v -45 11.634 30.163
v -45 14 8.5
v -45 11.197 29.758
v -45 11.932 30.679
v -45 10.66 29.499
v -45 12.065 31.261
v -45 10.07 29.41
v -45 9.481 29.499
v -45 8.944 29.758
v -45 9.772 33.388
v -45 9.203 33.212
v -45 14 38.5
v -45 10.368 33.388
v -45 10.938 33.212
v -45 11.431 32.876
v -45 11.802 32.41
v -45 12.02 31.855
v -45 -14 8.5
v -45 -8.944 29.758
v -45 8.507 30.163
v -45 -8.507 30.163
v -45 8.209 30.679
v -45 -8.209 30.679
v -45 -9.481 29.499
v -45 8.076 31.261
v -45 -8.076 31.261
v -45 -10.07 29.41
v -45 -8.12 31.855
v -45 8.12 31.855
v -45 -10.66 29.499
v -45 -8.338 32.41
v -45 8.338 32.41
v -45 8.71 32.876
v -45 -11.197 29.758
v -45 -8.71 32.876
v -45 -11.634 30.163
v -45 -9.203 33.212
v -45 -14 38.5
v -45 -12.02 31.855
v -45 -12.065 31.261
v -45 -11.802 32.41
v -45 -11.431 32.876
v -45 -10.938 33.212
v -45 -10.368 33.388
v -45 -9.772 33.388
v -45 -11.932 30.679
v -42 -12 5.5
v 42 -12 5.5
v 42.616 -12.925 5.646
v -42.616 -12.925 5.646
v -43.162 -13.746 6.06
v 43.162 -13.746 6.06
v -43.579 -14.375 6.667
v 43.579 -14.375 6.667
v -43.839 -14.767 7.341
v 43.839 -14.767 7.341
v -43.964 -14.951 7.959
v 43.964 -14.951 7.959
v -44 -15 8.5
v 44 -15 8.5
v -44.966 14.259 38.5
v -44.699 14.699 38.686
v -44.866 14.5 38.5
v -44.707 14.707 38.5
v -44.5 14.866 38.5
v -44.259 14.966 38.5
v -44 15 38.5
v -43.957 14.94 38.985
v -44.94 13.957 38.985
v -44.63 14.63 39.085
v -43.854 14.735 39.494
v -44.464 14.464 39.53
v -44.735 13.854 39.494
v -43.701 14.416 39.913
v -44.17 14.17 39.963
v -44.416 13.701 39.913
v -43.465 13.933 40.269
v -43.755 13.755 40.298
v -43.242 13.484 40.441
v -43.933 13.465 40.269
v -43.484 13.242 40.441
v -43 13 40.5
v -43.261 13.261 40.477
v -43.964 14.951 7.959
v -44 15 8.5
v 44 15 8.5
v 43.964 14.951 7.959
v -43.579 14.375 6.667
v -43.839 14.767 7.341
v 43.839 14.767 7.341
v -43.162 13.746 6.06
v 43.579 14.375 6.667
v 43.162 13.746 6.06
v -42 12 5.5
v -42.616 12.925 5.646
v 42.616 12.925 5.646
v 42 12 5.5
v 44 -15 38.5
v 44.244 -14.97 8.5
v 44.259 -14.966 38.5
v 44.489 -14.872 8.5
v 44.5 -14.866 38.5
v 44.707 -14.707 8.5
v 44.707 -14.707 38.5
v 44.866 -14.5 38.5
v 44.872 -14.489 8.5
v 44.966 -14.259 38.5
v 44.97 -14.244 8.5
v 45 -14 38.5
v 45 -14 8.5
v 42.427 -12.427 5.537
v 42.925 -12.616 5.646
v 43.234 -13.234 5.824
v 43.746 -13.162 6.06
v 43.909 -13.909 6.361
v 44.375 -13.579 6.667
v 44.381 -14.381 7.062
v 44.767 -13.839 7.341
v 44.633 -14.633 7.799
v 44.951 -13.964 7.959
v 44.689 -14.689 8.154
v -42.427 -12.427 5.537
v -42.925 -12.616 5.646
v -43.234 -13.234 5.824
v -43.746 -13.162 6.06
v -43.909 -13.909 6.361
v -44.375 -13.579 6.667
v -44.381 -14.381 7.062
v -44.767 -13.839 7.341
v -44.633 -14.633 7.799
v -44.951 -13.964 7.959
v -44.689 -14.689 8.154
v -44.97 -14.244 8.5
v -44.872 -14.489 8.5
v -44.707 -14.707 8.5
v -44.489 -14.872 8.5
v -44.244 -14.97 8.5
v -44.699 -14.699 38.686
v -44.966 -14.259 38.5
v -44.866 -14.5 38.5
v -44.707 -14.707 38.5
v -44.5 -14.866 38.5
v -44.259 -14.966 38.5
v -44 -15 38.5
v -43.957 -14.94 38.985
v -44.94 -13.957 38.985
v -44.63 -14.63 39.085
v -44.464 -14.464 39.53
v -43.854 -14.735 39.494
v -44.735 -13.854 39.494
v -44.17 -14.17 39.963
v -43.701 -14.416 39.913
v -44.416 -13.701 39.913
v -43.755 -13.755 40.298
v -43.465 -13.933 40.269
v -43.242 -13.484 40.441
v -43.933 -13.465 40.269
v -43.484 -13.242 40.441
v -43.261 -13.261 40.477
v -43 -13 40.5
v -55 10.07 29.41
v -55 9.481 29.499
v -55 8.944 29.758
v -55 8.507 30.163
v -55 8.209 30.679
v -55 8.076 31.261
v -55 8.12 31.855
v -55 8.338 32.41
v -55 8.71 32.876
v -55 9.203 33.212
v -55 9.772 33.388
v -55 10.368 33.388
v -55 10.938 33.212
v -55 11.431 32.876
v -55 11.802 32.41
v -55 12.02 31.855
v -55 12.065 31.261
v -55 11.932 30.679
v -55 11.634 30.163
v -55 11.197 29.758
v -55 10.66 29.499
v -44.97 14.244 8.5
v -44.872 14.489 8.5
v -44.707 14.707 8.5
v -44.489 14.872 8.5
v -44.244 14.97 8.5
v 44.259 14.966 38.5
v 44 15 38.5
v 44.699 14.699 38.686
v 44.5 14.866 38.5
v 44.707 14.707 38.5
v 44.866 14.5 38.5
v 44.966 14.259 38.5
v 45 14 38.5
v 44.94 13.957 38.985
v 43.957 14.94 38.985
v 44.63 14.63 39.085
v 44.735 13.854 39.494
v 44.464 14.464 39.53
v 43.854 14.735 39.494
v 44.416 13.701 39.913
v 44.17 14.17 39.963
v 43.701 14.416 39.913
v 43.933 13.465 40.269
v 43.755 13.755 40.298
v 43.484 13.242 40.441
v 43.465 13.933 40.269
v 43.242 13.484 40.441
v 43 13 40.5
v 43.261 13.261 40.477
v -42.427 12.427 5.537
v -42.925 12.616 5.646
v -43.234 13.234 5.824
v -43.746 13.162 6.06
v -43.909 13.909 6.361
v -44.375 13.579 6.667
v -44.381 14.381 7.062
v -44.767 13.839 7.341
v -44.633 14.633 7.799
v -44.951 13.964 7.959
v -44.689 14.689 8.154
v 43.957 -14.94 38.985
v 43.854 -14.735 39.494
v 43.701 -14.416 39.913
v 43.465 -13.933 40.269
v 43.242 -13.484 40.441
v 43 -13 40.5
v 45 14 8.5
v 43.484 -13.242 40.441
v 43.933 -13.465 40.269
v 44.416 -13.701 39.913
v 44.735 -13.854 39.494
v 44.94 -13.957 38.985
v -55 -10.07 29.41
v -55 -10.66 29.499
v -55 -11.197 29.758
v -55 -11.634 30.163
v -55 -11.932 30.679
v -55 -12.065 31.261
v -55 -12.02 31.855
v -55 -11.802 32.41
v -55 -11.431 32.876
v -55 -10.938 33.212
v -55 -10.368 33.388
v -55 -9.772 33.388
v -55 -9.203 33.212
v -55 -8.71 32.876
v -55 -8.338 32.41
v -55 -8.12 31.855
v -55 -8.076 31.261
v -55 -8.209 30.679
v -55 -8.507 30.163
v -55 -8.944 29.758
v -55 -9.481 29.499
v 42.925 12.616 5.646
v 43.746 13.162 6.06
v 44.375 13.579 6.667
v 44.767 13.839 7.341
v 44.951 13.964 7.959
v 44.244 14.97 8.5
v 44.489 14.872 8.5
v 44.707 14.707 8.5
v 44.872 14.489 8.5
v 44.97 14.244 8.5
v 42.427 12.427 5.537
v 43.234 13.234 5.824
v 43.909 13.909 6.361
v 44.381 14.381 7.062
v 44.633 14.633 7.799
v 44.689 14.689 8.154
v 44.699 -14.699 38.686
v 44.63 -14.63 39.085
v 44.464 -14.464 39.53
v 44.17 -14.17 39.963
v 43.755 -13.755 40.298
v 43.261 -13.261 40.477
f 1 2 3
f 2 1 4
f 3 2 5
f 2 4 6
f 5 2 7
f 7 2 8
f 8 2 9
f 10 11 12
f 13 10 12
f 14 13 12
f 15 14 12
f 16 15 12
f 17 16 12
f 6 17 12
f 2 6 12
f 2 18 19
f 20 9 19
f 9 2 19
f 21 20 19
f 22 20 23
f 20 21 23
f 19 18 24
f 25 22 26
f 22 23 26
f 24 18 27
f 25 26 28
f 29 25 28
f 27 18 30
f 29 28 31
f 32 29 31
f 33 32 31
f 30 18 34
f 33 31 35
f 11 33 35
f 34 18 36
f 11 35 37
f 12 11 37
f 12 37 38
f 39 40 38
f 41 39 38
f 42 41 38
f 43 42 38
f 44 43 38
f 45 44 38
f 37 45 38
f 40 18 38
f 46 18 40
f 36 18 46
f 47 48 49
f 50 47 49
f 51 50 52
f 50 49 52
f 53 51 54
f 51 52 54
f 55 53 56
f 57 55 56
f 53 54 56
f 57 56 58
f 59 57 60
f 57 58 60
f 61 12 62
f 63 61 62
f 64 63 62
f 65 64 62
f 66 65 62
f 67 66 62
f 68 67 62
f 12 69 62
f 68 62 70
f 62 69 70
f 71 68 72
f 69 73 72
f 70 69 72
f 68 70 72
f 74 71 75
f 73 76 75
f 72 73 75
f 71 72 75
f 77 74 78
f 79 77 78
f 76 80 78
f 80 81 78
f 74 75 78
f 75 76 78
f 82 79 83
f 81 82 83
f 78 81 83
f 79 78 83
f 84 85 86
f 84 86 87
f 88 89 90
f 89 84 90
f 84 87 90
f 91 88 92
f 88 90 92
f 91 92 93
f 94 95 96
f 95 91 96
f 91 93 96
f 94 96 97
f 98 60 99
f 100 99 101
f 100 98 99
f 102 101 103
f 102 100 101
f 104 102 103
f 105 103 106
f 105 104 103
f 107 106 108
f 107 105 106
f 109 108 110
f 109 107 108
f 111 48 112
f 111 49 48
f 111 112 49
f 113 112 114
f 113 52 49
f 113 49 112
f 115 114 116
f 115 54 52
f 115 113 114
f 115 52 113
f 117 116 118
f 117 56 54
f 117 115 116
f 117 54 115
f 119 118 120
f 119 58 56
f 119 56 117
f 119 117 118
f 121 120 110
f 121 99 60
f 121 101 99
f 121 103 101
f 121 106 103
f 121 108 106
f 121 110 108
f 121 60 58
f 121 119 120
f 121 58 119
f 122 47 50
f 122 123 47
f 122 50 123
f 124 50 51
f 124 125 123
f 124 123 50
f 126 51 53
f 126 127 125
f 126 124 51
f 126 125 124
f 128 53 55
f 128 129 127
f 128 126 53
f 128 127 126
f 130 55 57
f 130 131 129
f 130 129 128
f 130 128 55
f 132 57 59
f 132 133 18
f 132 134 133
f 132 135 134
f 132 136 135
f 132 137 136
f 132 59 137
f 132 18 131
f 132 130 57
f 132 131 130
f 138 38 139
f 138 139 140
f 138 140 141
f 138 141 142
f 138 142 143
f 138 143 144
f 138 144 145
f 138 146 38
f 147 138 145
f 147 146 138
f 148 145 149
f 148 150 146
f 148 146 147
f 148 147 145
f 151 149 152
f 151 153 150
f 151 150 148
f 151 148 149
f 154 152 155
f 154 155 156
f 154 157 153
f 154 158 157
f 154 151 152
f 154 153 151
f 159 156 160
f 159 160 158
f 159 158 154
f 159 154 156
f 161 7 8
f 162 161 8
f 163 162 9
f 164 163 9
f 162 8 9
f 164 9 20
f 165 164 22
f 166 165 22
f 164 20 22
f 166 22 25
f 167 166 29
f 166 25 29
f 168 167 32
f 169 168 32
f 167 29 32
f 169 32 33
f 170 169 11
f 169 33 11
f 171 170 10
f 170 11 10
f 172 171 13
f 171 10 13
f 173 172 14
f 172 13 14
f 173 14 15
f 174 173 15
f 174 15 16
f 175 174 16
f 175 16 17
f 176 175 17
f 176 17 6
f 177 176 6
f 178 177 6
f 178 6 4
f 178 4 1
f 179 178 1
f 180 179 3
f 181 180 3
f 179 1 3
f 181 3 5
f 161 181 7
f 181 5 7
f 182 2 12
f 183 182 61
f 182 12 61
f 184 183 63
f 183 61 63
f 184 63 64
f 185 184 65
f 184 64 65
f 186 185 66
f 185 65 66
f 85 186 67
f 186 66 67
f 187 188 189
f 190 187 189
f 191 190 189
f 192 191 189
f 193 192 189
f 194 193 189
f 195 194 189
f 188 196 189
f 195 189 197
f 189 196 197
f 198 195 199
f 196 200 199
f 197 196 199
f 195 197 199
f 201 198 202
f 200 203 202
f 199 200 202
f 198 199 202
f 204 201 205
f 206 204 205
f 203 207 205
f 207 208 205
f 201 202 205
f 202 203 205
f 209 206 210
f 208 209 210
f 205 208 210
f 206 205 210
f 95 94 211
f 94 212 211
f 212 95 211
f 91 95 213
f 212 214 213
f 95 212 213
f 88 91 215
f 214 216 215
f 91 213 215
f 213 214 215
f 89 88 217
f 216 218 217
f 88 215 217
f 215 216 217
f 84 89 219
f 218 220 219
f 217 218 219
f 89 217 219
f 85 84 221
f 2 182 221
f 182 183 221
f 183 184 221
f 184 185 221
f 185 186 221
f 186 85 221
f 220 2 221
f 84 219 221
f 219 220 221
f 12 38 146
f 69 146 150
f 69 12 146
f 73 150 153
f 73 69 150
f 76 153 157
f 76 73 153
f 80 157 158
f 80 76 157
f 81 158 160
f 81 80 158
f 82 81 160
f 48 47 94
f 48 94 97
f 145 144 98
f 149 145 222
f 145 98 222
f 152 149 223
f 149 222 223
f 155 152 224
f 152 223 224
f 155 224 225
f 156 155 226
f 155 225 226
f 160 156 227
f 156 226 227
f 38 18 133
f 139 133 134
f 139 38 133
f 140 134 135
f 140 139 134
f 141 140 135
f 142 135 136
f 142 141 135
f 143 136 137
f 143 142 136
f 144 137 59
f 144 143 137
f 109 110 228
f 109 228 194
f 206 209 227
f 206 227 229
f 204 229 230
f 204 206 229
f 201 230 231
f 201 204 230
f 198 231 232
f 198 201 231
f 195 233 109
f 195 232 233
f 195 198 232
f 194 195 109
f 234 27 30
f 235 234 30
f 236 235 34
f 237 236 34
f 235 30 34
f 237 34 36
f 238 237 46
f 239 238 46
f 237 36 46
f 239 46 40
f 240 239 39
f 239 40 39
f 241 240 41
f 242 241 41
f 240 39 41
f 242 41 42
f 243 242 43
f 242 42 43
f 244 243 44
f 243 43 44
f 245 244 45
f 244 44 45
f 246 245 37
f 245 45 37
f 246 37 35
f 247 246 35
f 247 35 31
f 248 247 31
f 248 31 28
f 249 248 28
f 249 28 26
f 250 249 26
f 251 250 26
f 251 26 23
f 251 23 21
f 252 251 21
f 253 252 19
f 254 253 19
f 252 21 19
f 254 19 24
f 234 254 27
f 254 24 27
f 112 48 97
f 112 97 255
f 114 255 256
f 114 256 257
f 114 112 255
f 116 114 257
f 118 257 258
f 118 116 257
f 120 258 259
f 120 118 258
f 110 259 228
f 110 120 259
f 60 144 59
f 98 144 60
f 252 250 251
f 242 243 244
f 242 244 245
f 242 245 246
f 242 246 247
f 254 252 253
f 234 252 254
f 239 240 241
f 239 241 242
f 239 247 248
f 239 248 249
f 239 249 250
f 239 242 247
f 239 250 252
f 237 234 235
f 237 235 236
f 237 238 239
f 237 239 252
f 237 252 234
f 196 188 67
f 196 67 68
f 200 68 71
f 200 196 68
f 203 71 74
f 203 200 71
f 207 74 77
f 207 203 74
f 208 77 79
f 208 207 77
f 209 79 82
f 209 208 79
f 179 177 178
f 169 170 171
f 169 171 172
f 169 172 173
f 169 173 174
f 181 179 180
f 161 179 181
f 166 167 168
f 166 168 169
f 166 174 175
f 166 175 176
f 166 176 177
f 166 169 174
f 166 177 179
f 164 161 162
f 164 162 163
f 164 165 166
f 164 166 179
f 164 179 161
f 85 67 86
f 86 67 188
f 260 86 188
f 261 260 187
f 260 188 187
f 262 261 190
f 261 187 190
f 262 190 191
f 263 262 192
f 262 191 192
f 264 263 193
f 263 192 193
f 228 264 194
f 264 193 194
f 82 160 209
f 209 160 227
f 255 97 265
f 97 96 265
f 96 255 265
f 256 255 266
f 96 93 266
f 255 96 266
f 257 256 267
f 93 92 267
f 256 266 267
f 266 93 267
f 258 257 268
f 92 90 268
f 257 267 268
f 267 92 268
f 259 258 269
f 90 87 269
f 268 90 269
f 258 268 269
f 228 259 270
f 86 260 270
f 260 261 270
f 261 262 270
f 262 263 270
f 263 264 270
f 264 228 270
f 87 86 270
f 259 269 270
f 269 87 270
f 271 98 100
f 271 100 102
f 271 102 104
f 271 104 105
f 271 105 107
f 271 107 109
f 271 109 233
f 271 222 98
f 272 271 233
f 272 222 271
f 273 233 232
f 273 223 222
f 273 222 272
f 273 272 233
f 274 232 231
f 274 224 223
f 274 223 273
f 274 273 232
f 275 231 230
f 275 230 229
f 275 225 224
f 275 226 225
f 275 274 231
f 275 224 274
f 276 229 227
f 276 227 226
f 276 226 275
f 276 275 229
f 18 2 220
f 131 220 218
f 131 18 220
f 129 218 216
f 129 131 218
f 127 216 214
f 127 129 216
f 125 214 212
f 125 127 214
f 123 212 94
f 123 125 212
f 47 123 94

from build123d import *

# Parameters (mm, degrees)
SKETCH_W             = 90
SKETCH_H             = 35
PAD_DEPTH            = 15
SKETCH001_R          = 2
PAD001_DEPTH         = 10
FILLET_R             = 2
FILLET001_R          = 3
FILLET002_R          = 1
BODY_PLACEMENT_ANGLE = 90


with BuildPart() as part:
    # Sketch → Pad (new body, symmetric)
    with BuildSketch(Plane.XY):
        Rectangle(SKETCH_W, SKETCH_H)
    extrude(amount=PAD_DEPTH, both=True)

    # Sketch001 (on Face4 of Pad) → Pad001 (join)
    with BuildSketch(Plane(origin=(-45, 0, 0), x_dir=(0, -1, 0), z_dir=(-1, 0, 0))):
        with Locations((-8.41, 10.070301)):
            Circle(SKETCH001_R)
        with Locations((-8.41, -10.070301)):
            Circle(SKETCH001_R)
    extrude(amount=PAD001_DEPTH)

    # Fillet
    fillet_edges = [part.edges().sort_by_distance(p)[0] for p in [
        (-45, 17.5, 0),
        (45, 17.5, 0),
        (0, 17.5, -15),
        (0, 17.5, 15),
    ]]
    fillet(fillet_edges, radius=FILLET_R)

    # Fillet001
    fillet001_edges = [part.edges().sort_by_distance(p)[0] for p in [
        (45, -17.5, 0),
        (-45, -17.5, 0),
        (0, -17.5, -15),
        (0, -17.5, 15),
    ]]
    fillet(fillet001_edges, radius=FILLET001_R)

    # Fillet002
    fillet002_edges = [part.edges().sort_by_distance(p)[0] for p in [
        (-45, 0.5, -15),
        (-45, 0.5, 15),
        (45, 0.5, 15),
        (45, 0.5, -15),
    ]]
    fillet(fillet002_edges, radius=FILLET002_R)


with BuildPart() as part_1:
    # Body placement: moved
    add(part.part.moved(Location((0, 0, 23))).rotate(Axis((0, 0, 23), (1, 0, 0)), BODY_PLACEMENT_ANGLE))


solid = part_1.part
